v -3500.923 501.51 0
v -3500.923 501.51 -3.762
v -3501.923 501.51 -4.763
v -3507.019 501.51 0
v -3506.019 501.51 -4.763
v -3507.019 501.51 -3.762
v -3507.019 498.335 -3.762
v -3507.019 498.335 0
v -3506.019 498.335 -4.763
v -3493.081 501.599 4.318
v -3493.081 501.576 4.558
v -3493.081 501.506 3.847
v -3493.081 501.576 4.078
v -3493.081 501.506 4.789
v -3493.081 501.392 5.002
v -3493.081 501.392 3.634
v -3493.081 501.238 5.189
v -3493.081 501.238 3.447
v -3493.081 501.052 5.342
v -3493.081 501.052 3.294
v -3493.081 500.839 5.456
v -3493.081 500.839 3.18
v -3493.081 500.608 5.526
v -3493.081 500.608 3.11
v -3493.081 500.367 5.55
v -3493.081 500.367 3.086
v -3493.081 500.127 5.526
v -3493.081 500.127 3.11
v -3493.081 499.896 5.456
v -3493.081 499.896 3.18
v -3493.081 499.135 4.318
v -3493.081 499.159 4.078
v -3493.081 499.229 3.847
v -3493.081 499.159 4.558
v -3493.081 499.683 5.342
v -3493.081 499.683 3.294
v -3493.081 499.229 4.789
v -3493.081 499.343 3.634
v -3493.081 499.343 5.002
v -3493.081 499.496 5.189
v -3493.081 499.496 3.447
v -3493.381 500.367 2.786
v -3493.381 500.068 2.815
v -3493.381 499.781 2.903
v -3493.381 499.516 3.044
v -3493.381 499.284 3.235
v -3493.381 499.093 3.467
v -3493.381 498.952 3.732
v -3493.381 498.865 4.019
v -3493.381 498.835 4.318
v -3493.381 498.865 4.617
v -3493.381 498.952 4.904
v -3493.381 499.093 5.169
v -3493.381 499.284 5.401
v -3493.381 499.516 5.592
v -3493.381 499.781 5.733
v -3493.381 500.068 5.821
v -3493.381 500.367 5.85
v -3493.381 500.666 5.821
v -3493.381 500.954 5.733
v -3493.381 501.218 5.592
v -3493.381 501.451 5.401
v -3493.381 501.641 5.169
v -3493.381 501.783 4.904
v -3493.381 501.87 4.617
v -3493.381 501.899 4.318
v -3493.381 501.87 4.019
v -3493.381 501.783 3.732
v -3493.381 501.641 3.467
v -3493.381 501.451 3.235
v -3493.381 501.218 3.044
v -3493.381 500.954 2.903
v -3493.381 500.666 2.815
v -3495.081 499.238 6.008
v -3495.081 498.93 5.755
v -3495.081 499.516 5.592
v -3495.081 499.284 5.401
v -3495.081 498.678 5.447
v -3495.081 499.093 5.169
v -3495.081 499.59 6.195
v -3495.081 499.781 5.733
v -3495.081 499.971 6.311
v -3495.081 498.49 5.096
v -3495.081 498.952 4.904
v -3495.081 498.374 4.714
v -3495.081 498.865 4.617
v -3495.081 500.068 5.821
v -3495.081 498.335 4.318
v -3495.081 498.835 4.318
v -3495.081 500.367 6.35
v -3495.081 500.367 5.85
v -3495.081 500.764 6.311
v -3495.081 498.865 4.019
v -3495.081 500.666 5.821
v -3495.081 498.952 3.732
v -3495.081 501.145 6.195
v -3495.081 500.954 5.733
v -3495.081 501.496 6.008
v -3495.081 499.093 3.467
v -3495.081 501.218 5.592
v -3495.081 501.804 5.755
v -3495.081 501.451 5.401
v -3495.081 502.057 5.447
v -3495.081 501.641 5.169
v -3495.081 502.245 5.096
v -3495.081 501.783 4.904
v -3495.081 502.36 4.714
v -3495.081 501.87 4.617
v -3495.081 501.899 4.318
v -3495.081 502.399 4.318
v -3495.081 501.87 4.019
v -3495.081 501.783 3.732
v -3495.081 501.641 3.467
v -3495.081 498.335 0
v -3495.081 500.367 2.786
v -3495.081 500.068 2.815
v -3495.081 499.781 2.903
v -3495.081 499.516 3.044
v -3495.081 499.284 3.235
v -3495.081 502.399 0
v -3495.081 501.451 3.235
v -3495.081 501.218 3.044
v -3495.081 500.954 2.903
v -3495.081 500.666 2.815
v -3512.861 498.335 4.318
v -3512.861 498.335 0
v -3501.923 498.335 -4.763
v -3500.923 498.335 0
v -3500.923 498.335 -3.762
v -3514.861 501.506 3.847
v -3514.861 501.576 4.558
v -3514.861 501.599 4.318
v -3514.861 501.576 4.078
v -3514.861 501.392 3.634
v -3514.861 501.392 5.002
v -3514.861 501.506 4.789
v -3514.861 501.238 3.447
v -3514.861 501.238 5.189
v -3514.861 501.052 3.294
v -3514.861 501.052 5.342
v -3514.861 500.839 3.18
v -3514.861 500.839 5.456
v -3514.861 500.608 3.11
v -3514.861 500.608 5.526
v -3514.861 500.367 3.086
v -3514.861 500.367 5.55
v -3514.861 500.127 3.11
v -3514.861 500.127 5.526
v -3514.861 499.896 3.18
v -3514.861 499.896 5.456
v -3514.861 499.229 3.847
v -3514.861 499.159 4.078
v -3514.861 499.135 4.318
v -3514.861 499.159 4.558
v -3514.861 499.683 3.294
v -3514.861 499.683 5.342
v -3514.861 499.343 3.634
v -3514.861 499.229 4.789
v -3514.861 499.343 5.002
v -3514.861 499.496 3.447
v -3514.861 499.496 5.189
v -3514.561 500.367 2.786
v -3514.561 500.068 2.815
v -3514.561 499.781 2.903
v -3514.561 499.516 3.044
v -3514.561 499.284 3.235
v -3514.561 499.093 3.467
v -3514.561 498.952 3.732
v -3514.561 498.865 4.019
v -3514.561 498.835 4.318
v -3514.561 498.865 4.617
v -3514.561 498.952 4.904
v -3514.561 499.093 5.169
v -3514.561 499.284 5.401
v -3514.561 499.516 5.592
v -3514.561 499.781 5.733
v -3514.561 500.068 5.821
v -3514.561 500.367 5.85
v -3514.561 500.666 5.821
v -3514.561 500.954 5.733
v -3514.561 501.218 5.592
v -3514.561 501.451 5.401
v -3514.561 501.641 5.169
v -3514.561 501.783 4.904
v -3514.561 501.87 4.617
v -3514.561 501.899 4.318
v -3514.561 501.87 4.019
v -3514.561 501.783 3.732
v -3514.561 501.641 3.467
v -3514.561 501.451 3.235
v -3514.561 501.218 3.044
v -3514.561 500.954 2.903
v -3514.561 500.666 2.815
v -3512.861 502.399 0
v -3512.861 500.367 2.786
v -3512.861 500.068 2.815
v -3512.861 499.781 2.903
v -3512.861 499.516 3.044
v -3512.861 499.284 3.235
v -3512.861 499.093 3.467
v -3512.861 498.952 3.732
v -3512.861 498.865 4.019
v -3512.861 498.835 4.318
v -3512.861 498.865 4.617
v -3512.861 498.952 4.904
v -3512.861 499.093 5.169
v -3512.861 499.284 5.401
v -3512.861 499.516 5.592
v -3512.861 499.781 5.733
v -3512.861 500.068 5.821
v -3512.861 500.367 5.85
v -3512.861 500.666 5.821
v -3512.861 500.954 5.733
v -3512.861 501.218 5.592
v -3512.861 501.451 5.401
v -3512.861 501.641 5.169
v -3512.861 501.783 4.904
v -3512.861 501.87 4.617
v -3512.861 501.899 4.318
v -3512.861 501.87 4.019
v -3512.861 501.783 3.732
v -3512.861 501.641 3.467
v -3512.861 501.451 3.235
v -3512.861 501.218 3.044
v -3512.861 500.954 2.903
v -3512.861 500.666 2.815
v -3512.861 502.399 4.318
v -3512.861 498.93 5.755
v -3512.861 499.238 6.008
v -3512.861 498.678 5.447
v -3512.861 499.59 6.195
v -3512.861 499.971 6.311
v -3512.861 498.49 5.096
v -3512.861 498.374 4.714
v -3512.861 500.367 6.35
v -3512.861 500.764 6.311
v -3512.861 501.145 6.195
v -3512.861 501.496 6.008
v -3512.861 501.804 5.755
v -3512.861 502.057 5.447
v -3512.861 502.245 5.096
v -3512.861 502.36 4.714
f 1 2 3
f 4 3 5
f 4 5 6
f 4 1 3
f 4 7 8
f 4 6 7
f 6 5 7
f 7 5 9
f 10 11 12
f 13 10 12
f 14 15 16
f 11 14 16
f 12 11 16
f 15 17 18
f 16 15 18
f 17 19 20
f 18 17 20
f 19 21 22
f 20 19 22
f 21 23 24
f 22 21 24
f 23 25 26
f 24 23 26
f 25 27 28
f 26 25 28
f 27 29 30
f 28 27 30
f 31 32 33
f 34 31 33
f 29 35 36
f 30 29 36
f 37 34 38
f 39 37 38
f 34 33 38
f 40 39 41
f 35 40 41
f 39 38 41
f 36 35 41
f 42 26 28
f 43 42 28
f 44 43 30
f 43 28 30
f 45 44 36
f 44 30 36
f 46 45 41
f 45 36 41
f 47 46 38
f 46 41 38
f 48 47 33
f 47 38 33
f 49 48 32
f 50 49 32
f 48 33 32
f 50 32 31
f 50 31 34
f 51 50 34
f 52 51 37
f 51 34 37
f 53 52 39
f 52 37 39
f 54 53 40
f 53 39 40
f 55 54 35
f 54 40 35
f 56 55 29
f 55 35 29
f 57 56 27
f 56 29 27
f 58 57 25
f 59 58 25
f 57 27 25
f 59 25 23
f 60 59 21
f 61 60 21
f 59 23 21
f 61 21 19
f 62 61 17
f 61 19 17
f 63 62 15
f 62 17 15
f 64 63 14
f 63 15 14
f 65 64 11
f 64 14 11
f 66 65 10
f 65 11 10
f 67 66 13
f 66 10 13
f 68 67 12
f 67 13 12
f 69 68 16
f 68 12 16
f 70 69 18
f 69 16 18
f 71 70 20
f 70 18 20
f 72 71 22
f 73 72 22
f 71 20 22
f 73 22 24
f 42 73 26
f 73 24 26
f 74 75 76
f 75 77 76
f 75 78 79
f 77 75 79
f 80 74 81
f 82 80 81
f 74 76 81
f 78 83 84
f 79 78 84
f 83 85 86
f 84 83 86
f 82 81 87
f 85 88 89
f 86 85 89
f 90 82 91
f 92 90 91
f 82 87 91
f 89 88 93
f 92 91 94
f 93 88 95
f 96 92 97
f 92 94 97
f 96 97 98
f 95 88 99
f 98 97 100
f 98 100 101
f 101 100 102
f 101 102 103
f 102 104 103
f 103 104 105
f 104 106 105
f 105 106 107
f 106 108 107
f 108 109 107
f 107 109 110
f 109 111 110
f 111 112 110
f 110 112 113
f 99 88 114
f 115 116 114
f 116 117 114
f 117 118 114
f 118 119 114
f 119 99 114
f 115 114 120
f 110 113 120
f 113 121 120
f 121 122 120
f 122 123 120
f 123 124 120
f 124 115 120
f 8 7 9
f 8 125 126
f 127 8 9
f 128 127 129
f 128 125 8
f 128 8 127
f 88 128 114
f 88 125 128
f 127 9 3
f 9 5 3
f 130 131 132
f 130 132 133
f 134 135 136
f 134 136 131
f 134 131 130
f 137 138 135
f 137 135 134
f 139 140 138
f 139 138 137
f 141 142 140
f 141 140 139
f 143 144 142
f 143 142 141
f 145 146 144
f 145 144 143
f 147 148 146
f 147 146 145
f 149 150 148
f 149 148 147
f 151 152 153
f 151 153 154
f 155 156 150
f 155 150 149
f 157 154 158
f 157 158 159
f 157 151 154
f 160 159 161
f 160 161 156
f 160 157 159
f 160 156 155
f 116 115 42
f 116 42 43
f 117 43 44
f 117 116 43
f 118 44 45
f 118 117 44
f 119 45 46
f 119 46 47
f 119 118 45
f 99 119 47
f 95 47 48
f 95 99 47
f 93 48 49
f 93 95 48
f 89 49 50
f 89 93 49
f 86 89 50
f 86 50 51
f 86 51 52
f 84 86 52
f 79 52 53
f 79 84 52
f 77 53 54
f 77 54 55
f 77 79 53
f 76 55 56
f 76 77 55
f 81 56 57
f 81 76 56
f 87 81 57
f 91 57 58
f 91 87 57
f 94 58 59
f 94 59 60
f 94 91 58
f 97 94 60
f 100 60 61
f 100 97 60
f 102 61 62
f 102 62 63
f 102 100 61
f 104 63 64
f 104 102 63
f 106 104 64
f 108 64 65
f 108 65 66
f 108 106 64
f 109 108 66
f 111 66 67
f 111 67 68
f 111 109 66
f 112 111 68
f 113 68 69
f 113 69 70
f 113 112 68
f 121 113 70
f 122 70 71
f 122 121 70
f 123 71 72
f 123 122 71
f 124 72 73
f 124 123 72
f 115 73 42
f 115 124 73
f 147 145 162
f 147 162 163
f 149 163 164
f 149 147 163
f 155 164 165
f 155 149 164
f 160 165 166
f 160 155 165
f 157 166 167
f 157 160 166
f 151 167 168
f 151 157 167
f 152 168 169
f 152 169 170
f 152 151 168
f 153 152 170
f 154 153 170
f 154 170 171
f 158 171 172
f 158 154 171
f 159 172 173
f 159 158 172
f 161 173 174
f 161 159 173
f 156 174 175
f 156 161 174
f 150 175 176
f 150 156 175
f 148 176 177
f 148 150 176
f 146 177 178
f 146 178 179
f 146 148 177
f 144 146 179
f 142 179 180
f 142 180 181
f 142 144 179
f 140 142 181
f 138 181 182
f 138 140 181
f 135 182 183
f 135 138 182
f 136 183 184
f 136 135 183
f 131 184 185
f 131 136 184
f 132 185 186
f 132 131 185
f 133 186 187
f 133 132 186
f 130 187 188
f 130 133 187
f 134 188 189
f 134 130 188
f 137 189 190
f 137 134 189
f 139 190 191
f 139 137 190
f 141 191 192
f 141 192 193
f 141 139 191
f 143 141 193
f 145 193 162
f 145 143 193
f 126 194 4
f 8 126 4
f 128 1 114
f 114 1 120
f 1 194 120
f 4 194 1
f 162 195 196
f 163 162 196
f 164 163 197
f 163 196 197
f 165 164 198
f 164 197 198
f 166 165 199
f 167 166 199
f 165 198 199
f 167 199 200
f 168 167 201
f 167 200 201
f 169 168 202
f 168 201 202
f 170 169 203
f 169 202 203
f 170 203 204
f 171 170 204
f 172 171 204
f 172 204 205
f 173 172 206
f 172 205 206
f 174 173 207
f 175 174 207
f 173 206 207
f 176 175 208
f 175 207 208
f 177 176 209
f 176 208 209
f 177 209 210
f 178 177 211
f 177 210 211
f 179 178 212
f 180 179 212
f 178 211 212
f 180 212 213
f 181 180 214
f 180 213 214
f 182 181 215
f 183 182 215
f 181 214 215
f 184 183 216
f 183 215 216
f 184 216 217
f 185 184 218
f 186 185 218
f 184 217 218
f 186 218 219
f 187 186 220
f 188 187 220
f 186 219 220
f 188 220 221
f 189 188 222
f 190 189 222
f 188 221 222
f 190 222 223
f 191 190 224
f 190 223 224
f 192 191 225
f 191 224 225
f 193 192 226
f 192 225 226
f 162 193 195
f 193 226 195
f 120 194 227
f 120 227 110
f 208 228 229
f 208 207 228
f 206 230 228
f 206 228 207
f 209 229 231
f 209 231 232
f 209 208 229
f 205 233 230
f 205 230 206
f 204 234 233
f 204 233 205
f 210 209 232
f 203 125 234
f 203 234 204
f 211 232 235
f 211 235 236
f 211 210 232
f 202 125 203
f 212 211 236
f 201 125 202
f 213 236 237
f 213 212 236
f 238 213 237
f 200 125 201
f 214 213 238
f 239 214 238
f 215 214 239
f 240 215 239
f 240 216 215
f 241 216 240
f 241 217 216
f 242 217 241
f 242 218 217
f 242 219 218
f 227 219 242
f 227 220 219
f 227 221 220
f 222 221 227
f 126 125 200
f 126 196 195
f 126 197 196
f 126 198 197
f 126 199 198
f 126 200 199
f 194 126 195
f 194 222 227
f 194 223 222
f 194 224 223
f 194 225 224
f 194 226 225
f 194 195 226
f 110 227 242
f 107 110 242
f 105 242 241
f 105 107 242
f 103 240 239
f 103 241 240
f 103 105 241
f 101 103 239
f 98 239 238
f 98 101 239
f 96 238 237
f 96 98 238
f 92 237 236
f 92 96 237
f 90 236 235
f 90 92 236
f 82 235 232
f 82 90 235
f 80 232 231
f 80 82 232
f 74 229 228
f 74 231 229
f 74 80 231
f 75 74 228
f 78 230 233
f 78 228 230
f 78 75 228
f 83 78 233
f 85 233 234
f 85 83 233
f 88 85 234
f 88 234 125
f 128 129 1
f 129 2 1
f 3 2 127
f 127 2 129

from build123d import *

# Parameters (mm, degrees)
SKETCH1_W                = 17.78
SKETCH1_H                = 4.064
BOSS_EXTRUDE1_DEPTH      = 6.35
FILLET1_RADIUS           = 2.032
FILLET1_LENGTH           = 17.78
SKETCH2_R                = 1.532
BOSS_EXTRUDE2_DEPTH      = 2
CHAMFER1_SIZE            = 0.3
CHAMFER1_OF_MIRROR1_SIZE = 0.3
SKETCH3_W                = 6.096
SKETCH3_H                = 3.048
BOSS_EXTRUDE3_DEPTH      = 4.7625
SKETCH4_W                = 6.096
SKETCH4_H                = 4.7625
BOSS_EXTRUDE4_DEPTH      = 0.127
CHAMFER2_SIZE            = 1


with BuildPart() as part:
    # Sketch1 → Boss-Extrude1 (new body)
    with BuildSketch(Plane.XY):
        with Locations((-3503.971479642, 500.3673)):
            Rectangle(SKETCH1_W, SKETCH1_H)
    extrude(amount=BOSS_EXTRUDE1_DEPTH)

    # Fillet1: full round fillet: the end face becomes a half cylinder, R = half its width
    fillet1_face = Plane((-3503.971479642, 500.3673, 6.35), x_dir=(1, 0, 0), z_dir=(0, 0, 1))  # on the end face: x along it, z out of the body
    fillet1_slab = fillet1_face.offset(-FILLET1_RADIUS / 2) * Box(FILLET1_LENGTH, 2 * FILLET1_RADIUS, FILLET1_RADIUS, mode=Mode.PRIVATE)  # the body's end, R deep
    fillet1_round = Plane((-3503.971479642, 500.3673, 4.318), x_dir=(0, 0, 1), z_dir=(1, 0, 0)) * Cylinder(FILLET1_RADIUS, FILLET1_LENGTH, mode=Mode.PRIVATE)  # its axis R under the face
    add(fillet1_slab - fillet1_round, mode=Mode.SUBTRACT)

    # Sketch2 → Boss-Extrude2 (add)
    with BuildSketch(Plane.ZY.offset(3512.861479642)):
        with Locations(Location((4.318, 500.3673, 0), (0, 0, 180))):
            Circle(SKETCH2_R)
    boss_extrude2 = extrude(amount=BOSS_EXTRUDE2_DEPTH)

    # Chamfer1
    chamfer1_edges = [part.edges().sort_by_distance(p)[0] for p in [
        (-3514.861479642, 500.3673, 5.85),
    ]]
    chamfer(chamfer1_edges, length=CHAMFER1_SIZE)

    # Mirror1: Boss-Extrude2 across plane
    add(boss_extrude2.mirror(Plane.ZY.offset(3503.971479642)))

    # Chamfer1 of Mirror1
    chamfer1_of_mirror1_edges = [part.edges().sort_by_distance(p)[0] for p in [
        (-3493.081479642, 500.3673, 5.85),
    ]]
    chamfer(chamfer1_of_mirror1_edges, length=CHAMFER1_OF_MIRROR1_SIZE)

    # Sketch3 → Boss-Extrude3 (add)
    with BuildSketch(Plane(origin=(0, 0, 0), x_dir=(-1, 0, 0), z_dir=(0, 0, -1))):
        with Locations((3503.971479642, 499.9863)):
            Rectangle(SKETCH3_W, SKETCH3_H)
    extrude(amount=BOSS_EXTRUDE3_DEPTH)

    # Sketch4 → Boss-Extrude4 (add)
    with BuildSketch(Plane.XZ.offset(-498.4623)):
        with Locations((-3503.971479642, -2.38125)):
            Rectangle(SKETCH4_W, SKETCH4_H)
    extrude(amount=BOSS_EXTRUDE4_DEPTH)

    # Chamfer2
    chamfer2_edges = [part.edges().sort_by_distance(p)[0] for p in [
        (-3500.923479642, 499.9228, -4.7625),
        (-3507.019479642, 499.9228, -4.7625),
    ]]
    chamfer(chamfer2_edges, length=CHAMFER2_SIZE)


solid = part.part
